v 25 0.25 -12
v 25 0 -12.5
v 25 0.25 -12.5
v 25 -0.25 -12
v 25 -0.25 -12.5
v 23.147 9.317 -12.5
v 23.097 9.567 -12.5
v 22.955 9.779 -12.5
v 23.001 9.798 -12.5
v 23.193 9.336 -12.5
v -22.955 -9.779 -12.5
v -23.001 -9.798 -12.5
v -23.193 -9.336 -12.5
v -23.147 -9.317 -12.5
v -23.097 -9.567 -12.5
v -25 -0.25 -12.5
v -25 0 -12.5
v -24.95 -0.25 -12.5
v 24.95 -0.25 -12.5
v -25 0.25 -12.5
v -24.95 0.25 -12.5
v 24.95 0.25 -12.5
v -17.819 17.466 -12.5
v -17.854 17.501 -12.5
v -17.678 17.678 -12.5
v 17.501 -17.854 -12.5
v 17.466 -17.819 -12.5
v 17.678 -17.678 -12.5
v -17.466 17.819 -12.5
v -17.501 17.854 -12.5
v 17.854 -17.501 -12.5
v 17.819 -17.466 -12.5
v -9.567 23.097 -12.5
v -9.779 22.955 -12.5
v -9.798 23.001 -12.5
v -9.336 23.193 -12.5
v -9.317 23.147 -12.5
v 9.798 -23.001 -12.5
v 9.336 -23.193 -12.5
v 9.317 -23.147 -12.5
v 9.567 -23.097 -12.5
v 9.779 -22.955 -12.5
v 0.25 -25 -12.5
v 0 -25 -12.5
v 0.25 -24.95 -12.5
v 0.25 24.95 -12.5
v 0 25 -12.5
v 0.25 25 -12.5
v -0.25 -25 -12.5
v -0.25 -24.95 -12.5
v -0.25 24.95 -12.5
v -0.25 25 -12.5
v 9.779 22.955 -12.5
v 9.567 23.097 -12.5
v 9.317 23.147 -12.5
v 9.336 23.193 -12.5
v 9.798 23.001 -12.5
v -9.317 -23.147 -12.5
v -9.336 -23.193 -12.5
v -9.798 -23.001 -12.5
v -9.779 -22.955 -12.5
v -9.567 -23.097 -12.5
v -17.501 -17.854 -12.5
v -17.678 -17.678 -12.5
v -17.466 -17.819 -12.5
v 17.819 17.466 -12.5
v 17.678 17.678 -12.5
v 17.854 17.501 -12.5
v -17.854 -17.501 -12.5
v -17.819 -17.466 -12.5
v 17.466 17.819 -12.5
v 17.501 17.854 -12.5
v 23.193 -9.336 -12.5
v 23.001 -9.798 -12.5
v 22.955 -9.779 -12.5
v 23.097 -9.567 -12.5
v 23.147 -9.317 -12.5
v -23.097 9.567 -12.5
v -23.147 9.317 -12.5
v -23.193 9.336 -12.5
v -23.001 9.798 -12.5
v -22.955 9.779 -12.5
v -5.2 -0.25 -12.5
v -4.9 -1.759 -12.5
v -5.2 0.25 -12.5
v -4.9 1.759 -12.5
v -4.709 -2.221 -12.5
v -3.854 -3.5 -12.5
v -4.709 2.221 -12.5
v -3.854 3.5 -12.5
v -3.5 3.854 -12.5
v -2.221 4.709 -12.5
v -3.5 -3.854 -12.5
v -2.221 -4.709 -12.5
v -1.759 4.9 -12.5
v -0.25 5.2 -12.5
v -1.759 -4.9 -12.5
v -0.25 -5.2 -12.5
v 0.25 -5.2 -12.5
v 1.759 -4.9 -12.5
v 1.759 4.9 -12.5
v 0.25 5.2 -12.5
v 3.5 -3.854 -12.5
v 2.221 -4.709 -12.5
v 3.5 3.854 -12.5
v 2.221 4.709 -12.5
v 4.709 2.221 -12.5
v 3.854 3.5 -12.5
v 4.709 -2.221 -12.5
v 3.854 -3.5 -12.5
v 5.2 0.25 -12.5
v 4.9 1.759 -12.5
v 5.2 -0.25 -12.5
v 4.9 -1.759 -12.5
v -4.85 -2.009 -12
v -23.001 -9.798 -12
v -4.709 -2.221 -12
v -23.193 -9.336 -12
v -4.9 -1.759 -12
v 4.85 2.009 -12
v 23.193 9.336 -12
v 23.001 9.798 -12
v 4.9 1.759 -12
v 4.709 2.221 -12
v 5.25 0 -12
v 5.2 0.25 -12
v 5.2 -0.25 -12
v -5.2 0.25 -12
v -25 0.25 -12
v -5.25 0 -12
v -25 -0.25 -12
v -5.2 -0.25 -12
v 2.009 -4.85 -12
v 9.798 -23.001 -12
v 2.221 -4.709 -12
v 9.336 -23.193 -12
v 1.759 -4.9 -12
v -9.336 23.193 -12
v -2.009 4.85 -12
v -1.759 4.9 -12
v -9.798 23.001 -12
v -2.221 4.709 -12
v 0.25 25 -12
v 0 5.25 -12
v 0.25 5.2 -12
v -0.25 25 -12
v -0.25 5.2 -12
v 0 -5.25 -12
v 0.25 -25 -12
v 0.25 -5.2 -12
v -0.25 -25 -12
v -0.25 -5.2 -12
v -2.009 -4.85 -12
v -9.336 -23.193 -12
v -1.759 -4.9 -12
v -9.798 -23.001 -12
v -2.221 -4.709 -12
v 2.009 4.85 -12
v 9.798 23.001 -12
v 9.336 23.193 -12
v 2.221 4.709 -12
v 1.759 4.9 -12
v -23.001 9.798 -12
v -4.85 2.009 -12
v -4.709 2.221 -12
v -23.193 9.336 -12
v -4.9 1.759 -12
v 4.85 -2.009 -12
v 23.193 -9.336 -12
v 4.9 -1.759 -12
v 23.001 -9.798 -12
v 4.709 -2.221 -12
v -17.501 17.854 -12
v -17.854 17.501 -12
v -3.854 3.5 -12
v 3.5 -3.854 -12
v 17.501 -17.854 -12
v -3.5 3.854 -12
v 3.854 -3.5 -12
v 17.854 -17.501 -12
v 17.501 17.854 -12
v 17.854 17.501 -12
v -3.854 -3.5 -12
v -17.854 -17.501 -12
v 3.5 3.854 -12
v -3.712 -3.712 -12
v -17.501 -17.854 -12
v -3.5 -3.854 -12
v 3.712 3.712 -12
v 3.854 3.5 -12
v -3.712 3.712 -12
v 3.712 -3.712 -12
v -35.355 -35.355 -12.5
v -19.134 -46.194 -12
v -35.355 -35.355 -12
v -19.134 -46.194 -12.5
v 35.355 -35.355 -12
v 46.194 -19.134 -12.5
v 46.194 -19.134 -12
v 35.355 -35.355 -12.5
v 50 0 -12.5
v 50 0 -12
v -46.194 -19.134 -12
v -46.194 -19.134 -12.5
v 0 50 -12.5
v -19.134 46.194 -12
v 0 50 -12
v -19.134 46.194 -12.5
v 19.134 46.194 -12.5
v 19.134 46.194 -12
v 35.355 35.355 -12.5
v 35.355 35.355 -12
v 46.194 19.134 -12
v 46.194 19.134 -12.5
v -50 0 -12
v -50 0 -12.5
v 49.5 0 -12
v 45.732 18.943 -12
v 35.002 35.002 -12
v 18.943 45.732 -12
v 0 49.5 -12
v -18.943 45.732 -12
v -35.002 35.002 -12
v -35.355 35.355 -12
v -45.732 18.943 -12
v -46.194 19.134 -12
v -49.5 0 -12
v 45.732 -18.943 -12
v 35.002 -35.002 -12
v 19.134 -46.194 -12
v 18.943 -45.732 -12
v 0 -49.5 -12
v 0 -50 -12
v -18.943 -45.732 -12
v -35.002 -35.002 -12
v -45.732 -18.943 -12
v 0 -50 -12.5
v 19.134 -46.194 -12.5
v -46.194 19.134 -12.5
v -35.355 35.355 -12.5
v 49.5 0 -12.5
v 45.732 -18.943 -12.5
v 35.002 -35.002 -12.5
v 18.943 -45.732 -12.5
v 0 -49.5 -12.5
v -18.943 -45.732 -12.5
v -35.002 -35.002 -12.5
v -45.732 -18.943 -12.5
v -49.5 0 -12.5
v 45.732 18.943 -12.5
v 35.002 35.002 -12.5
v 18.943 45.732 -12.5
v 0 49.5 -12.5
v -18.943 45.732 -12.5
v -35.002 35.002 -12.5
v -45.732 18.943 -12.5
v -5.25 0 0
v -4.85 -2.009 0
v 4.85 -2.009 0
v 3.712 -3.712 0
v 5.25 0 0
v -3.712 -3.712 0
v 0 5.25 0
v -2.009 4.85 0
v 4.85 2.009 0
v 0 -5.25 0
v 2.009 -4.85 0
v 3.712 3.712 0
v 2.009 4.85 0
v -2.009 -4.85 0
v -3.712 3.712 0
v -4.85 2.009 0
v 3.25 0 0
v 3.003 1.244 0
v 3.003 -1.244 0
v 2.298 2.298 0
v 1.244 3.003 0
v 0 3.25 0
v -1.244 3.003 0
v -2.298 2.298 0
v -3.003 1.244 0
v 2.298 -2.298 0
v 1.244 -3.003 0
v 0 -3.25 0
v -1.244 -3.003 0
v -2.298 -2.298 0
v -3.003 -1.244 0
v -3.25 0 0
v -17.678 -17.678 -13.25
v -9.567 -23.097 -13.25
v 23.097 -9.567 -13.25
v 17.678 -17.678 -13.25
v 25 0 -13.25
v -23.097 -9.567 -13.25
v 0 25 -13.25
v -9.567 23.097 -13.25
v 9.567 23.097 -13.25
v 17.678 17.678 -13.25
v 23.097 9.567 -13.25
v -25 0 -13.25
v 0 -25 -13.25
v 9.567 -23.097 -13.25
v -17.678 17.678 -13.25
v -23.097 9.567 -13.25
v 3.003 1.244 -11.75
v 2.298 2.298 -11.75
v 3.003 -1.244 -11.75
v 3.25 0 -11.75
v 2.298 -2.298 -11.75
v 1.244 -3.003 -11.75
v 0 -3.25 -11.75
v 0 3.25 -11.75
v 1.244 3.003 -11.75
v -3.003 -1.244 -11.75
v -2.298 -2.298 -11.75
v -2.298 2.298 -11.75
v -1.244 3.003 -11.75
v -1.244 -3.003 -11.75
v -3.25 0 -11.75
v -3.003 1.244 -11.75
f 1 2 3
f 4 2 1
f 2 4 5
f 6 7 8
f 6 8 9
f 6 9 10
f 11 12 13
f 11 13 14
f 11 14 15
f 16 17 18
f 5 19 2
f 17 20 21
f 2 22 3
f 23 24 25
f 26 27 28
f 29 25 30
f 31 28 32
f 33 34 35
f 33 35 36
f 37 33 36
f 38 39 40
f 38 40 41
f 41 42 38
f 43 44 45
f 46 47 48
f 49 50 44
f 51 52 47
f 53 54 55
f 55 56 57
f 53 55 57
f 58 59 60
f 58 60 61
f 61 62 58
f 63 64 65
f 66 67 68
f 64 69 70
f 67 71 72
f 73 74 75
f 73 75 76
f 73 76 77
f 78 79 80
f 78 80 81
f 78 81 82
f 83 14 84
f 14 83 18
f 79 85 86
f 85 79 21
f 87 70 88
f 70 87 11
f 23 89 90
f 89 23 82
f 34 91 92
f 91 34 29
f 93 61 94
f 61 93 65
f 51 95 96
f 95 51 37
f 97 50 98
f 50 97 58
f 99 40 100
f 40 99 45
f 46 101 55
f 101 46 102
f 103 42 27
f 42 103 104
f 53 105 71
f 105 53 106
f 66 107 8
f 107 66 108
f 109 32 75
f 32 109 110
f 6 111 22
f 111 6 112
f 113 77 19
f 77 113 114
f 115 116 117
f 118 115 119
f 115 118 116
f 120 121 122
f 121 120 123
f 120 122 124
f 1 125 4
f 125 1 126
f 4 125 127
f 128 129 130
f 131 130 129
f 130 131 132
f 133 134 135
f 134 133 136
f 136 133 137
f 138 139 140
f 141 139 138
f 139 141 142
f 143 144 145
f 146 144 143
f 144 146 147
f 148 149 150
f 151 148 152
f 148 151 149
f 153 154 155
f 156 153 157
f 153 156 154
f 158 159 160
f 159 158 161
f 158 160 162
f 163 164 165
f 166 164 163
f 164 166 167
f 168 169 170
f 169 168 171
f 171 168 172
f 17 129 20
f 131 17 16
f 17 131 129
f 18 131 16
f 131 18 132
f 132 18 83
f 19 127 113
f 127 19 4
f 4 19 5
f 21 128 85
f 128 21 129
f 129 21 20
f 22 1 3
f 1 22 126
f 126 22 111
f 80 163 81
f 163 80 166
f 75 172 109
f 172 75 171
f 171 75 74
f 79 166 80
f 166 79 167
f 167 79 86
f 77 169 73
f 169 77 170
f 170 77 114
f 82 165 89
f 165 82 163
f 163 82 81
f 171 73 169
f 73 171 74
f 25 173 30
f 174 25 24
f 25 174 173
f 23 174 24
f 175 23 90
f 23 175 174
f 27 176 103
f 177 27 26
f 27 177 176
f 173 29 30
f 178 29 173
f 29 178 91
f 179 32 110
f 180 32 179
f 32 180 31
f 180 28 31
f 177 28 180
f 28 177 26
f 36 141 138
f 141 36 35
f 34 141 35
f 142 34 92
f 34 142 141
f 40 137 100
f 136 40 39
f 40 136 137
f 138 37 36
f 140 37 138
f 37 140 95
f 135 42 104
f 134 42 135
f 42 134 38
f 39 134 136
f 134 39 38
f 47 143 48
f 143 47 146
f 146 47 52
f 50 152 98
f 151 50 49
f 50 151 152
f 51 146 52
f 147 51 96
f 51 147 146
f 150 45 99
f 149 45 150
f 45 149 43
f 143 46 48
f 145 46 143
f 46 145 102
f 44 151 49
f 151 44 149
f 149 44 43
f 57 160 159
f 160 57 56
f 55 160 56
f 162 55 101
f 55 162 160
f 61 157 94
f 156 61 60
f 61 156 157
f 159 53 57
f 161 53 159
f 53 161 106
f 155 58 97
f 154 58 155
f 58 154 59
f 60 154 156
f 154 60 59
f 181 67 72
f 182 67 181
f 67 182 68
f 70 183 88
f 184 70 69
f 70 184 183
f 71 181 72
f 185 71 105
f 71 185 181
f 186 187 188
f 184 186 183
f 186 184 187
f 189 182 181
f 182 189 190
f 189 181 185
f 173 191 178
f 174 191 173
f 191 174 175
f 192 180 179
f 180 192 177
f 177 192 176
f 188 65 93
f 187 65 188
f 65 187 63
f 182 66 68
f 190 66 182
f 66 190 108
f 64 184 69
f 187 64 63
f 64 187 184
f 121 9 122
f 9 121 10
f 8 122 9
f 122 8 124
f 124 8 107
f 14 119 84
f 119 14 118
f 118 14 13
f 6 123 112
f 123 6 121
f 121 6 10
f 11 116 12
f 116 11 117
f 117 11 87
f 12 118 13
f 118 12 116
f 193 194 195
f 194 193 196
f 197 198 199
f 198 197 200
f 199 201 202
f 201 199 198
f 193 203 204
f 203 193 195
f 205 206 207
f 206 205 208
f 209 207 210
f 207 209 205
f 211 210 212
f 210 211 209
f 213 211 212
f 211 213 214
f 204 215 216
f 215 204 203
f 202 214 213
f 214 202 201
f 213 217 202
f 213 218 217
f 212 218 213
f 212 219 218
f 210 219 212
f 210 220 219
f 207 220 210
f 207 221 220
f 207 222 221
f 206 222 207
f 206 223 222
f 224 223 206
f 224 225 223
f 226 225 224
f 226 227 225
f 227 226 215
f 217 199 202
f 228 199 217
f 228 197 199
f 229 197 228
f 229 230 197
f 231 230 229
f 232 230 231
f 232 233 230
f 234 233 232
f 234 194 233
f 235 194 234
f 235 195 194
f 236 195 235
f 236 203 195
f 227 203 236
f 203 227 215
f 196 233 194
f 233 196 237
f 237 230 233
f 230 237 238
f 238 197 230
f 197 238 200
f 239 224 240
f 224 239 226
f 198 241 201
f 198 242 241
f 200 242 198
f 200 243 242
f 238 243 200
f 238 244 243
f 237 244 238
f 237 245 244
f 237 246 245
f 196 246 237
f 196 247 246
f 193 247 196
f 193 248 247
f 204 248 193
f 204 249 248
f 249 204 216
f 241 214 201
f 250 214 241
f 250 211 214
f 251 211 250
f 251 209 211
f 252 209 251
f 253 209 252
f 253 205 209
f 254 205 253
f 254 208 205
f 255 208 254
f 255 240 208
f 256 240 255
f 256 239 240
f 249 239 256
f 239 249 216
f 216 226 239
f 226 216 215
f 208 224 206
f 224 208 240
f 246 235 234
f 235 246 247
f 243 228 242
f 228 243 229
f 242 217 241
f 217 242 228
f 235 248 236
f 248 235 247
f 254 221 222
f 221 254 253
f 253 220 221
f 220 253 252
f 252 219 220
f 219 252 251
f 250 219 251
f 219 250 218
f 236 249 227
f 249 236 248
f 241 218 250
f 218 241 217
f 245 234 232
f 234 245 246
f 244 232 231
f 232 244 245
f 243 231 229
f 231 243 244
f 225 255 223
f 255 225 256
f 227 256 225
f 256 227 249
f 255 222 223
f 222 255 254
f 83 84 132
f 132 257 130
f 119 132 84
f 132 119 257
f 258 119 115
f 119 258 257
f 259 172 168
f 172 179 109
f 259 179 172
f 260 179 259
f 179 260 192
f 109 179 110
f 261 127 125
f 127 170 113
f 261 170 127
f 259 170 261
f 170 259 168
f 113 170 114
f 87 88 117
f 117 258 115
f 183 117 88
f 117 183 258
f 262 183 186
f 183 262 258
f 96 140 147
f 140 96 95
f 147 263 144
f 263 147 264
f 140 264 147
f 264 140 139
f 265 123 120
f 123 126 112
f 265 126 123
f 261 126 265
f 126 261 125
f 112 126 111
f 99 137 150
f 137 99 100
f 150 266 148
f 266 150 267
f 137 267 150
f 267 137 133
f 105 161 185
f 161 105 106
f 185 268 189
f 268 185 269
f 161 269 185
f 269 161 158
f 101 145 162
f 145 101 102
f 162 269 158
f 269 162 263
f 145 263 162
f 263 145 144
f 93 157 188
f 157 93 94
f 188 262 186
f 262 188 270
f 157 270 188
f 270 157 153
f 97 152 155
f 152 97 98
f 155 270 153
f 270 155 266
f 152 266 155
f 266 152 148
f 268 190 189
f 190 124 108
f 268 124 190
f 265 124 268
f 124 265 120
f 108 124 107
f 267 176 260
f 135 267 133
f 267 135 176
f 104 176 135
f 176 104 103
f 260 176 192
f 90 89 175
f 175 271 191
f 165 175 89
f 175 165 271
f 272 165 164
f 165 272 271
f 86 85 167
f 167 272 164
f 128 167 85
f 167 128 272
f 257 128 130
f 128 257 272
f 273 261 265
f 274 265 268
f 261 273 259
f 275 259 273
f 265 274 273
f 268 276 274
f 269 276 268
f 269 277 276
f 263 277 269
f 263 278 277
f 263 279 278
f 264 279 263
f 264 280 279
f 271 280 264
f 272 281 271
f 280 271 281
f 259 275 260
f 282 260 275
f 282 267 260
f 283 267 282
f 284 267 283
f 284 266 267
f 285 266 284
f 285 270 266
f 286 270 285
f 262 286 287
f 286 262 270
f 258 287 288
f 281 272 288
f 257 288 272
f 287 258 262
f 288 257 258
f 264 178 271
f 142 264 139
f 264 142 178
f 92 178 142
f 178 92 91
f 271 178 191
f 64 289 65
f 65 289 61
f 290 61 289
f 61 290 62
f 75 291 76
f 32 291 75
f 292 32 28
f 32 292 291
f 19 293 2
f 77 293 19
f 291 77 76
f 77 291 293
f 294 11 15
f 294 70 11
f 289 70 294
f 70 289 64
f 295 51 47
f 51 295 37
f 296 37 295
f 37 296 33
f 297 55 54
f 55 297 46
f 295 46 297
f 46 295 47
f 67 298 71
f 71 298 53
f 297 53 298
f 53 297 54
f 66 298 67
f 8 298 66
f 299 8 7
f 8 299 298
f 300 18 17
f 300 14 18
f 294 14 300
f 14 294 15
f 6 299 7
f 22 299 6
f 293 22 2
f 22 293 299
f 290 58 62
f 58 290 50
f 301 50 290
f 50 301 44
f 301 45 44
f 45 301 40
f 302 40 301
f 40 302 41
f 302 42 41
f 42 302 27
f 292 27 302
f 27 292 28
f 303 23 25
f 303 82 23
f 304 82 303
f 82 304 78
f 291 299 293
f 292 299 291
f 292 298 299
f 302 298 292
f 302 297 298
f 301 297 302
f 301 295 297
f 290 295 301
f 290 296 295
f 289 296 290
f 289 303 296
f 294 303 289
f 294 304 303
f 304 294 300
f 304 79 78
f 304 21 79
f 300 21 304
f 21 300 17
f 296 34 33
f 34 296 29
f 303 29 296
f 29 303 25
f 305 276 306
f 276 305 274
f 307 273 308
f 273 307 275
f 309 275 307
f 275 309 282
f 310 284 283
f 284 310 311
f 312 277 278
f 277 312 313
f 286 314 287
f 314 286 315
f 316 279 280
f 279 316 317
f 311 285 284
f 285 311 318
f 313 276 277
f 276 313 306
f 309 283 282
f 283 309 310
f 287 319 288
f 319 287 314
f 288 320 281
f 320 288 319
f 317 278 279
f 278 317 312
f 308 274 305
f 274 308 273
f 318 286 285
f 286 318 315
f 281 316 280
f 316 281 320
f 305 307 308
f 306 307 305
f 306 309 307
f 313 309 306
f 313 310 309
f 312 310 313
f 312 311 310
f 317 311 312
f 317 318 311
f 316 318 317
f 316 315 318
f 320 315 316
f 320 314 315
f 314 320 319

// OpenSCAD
module render() {
  fn = 16;
  thickness = 0.75;
  expansion_fudge = 0.5;
  shaft_radius = (6 + expansion_fudge) / 2.0;
  coupler_thickness = 2;
  coupler_radius = shaft_radius + coupler_thickness;
  coupler_length = 12.5;
  // plate_radius = 170.0 / 2.0;
  plate_radius = 50.0 / 2.0;
  ridge_margin = 5.0;
  ridge_len = (plate_radius * 2.0);
  ridge_dim = 0.5;
  ridge_radius = 100.0 / 2.0;
  rotate(a=180, v=[1,0,0])
  difference() {
    union() {
      cylinder(h = coupler_length,
               r1 = coupler_radius,
               r2 = coupler_radius, $fn=fn);
      for(rot = [0 : 22.5 : 337.5]) {
        rotate(a=rot, v=[0,0,1])
        translate([-ridge_len/2.0,
                   -ridge_dim/2.0,
                   coupler_length-ridge_dim]) {
          cube(size = [ridge_len, ridge_dim, ridge_dim]);
        }
      }

      translate([0, 0, coupler_length-ridge_dim]) {
        difference() {
          cylinder(h = ridge_dim,
                   r1 = ridge_radius,
                   r2 = ridge_radius, $fn=fn);
          cylinder(h = ridge_dim,
                   r1 = ridge_radius-ridge_dim,
                   r2 = ridge_radius-ridge_dim, $fn=fn);
        }
      }

      translate([0, 0, coupler_length]) {
        cylinder(h = thickness,
                 r1 = plate_radius,
                 r2 = plate_radius, $fn=fn);
      }
    }
    cylinder(h = coupler_length - thickness,
             r1 = shaft_radius,
             r2 = shaft_radius, $fn=fn);
  }
}

// Render main
echo(version=version());
render();
